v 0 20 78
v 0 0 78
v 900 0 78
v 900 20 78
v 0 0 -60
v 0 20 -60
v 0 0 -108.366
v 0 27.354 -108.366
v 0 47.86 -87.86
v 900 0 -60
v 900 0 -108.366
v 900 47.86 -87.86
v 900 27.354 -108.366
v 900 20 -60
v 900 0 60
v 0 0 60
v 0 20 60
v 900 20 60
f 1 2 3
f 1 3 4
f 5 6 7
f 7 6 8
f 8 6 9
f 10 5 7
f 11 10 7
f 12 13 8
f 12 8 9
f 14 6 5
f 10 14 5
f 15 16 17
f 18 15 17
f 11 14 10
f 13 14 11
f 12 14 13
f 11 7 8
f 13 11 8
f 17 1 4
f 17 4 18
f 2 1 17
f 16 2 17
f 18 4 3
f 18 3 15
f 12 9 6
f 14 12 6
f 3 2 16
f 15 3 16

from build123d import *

# Parameters (mm, degrees)
SKETCH2_W             = 18
SKETCH2_H             = 20
BOSS_EXTRUDE1_DEPTH   = 900
BOSS_EXTRUDE1_2_DEPTH = 900


with BuildPart() as part:
    # Sketch2 → Boss-Extrude1 (new body)
    with BuildSketch(Plane(origin=(0, 0, 0), x_dir=(0, 0, -1), z_dir=(1, 0, 0))):
        with Locations((-69, 10)):
            Rectangle(SKETCH2_W, SKETCH2_H)
    extrude(amount=BOSS_EXTRUDE1_DEPTH)


with BuildPart() as body_2:
    # Sketch2 → Boss-Extrude1 2 (new body)
    with BuildSketch(Plane(origin=(0, 0, 0), x_dir=(0, 0, -1), z_dir=(1, 0, 0))):
        Polygon((87.860007179, 47.860007179), (60, 20), (60, 0), (108.366103833, 0), (108.366103833, 27.353910524), align=None)
    extrude(amount=BOSS_EXTRUDE1_2_DEPTH)


solid = Compound([part.part, body_2.part])
